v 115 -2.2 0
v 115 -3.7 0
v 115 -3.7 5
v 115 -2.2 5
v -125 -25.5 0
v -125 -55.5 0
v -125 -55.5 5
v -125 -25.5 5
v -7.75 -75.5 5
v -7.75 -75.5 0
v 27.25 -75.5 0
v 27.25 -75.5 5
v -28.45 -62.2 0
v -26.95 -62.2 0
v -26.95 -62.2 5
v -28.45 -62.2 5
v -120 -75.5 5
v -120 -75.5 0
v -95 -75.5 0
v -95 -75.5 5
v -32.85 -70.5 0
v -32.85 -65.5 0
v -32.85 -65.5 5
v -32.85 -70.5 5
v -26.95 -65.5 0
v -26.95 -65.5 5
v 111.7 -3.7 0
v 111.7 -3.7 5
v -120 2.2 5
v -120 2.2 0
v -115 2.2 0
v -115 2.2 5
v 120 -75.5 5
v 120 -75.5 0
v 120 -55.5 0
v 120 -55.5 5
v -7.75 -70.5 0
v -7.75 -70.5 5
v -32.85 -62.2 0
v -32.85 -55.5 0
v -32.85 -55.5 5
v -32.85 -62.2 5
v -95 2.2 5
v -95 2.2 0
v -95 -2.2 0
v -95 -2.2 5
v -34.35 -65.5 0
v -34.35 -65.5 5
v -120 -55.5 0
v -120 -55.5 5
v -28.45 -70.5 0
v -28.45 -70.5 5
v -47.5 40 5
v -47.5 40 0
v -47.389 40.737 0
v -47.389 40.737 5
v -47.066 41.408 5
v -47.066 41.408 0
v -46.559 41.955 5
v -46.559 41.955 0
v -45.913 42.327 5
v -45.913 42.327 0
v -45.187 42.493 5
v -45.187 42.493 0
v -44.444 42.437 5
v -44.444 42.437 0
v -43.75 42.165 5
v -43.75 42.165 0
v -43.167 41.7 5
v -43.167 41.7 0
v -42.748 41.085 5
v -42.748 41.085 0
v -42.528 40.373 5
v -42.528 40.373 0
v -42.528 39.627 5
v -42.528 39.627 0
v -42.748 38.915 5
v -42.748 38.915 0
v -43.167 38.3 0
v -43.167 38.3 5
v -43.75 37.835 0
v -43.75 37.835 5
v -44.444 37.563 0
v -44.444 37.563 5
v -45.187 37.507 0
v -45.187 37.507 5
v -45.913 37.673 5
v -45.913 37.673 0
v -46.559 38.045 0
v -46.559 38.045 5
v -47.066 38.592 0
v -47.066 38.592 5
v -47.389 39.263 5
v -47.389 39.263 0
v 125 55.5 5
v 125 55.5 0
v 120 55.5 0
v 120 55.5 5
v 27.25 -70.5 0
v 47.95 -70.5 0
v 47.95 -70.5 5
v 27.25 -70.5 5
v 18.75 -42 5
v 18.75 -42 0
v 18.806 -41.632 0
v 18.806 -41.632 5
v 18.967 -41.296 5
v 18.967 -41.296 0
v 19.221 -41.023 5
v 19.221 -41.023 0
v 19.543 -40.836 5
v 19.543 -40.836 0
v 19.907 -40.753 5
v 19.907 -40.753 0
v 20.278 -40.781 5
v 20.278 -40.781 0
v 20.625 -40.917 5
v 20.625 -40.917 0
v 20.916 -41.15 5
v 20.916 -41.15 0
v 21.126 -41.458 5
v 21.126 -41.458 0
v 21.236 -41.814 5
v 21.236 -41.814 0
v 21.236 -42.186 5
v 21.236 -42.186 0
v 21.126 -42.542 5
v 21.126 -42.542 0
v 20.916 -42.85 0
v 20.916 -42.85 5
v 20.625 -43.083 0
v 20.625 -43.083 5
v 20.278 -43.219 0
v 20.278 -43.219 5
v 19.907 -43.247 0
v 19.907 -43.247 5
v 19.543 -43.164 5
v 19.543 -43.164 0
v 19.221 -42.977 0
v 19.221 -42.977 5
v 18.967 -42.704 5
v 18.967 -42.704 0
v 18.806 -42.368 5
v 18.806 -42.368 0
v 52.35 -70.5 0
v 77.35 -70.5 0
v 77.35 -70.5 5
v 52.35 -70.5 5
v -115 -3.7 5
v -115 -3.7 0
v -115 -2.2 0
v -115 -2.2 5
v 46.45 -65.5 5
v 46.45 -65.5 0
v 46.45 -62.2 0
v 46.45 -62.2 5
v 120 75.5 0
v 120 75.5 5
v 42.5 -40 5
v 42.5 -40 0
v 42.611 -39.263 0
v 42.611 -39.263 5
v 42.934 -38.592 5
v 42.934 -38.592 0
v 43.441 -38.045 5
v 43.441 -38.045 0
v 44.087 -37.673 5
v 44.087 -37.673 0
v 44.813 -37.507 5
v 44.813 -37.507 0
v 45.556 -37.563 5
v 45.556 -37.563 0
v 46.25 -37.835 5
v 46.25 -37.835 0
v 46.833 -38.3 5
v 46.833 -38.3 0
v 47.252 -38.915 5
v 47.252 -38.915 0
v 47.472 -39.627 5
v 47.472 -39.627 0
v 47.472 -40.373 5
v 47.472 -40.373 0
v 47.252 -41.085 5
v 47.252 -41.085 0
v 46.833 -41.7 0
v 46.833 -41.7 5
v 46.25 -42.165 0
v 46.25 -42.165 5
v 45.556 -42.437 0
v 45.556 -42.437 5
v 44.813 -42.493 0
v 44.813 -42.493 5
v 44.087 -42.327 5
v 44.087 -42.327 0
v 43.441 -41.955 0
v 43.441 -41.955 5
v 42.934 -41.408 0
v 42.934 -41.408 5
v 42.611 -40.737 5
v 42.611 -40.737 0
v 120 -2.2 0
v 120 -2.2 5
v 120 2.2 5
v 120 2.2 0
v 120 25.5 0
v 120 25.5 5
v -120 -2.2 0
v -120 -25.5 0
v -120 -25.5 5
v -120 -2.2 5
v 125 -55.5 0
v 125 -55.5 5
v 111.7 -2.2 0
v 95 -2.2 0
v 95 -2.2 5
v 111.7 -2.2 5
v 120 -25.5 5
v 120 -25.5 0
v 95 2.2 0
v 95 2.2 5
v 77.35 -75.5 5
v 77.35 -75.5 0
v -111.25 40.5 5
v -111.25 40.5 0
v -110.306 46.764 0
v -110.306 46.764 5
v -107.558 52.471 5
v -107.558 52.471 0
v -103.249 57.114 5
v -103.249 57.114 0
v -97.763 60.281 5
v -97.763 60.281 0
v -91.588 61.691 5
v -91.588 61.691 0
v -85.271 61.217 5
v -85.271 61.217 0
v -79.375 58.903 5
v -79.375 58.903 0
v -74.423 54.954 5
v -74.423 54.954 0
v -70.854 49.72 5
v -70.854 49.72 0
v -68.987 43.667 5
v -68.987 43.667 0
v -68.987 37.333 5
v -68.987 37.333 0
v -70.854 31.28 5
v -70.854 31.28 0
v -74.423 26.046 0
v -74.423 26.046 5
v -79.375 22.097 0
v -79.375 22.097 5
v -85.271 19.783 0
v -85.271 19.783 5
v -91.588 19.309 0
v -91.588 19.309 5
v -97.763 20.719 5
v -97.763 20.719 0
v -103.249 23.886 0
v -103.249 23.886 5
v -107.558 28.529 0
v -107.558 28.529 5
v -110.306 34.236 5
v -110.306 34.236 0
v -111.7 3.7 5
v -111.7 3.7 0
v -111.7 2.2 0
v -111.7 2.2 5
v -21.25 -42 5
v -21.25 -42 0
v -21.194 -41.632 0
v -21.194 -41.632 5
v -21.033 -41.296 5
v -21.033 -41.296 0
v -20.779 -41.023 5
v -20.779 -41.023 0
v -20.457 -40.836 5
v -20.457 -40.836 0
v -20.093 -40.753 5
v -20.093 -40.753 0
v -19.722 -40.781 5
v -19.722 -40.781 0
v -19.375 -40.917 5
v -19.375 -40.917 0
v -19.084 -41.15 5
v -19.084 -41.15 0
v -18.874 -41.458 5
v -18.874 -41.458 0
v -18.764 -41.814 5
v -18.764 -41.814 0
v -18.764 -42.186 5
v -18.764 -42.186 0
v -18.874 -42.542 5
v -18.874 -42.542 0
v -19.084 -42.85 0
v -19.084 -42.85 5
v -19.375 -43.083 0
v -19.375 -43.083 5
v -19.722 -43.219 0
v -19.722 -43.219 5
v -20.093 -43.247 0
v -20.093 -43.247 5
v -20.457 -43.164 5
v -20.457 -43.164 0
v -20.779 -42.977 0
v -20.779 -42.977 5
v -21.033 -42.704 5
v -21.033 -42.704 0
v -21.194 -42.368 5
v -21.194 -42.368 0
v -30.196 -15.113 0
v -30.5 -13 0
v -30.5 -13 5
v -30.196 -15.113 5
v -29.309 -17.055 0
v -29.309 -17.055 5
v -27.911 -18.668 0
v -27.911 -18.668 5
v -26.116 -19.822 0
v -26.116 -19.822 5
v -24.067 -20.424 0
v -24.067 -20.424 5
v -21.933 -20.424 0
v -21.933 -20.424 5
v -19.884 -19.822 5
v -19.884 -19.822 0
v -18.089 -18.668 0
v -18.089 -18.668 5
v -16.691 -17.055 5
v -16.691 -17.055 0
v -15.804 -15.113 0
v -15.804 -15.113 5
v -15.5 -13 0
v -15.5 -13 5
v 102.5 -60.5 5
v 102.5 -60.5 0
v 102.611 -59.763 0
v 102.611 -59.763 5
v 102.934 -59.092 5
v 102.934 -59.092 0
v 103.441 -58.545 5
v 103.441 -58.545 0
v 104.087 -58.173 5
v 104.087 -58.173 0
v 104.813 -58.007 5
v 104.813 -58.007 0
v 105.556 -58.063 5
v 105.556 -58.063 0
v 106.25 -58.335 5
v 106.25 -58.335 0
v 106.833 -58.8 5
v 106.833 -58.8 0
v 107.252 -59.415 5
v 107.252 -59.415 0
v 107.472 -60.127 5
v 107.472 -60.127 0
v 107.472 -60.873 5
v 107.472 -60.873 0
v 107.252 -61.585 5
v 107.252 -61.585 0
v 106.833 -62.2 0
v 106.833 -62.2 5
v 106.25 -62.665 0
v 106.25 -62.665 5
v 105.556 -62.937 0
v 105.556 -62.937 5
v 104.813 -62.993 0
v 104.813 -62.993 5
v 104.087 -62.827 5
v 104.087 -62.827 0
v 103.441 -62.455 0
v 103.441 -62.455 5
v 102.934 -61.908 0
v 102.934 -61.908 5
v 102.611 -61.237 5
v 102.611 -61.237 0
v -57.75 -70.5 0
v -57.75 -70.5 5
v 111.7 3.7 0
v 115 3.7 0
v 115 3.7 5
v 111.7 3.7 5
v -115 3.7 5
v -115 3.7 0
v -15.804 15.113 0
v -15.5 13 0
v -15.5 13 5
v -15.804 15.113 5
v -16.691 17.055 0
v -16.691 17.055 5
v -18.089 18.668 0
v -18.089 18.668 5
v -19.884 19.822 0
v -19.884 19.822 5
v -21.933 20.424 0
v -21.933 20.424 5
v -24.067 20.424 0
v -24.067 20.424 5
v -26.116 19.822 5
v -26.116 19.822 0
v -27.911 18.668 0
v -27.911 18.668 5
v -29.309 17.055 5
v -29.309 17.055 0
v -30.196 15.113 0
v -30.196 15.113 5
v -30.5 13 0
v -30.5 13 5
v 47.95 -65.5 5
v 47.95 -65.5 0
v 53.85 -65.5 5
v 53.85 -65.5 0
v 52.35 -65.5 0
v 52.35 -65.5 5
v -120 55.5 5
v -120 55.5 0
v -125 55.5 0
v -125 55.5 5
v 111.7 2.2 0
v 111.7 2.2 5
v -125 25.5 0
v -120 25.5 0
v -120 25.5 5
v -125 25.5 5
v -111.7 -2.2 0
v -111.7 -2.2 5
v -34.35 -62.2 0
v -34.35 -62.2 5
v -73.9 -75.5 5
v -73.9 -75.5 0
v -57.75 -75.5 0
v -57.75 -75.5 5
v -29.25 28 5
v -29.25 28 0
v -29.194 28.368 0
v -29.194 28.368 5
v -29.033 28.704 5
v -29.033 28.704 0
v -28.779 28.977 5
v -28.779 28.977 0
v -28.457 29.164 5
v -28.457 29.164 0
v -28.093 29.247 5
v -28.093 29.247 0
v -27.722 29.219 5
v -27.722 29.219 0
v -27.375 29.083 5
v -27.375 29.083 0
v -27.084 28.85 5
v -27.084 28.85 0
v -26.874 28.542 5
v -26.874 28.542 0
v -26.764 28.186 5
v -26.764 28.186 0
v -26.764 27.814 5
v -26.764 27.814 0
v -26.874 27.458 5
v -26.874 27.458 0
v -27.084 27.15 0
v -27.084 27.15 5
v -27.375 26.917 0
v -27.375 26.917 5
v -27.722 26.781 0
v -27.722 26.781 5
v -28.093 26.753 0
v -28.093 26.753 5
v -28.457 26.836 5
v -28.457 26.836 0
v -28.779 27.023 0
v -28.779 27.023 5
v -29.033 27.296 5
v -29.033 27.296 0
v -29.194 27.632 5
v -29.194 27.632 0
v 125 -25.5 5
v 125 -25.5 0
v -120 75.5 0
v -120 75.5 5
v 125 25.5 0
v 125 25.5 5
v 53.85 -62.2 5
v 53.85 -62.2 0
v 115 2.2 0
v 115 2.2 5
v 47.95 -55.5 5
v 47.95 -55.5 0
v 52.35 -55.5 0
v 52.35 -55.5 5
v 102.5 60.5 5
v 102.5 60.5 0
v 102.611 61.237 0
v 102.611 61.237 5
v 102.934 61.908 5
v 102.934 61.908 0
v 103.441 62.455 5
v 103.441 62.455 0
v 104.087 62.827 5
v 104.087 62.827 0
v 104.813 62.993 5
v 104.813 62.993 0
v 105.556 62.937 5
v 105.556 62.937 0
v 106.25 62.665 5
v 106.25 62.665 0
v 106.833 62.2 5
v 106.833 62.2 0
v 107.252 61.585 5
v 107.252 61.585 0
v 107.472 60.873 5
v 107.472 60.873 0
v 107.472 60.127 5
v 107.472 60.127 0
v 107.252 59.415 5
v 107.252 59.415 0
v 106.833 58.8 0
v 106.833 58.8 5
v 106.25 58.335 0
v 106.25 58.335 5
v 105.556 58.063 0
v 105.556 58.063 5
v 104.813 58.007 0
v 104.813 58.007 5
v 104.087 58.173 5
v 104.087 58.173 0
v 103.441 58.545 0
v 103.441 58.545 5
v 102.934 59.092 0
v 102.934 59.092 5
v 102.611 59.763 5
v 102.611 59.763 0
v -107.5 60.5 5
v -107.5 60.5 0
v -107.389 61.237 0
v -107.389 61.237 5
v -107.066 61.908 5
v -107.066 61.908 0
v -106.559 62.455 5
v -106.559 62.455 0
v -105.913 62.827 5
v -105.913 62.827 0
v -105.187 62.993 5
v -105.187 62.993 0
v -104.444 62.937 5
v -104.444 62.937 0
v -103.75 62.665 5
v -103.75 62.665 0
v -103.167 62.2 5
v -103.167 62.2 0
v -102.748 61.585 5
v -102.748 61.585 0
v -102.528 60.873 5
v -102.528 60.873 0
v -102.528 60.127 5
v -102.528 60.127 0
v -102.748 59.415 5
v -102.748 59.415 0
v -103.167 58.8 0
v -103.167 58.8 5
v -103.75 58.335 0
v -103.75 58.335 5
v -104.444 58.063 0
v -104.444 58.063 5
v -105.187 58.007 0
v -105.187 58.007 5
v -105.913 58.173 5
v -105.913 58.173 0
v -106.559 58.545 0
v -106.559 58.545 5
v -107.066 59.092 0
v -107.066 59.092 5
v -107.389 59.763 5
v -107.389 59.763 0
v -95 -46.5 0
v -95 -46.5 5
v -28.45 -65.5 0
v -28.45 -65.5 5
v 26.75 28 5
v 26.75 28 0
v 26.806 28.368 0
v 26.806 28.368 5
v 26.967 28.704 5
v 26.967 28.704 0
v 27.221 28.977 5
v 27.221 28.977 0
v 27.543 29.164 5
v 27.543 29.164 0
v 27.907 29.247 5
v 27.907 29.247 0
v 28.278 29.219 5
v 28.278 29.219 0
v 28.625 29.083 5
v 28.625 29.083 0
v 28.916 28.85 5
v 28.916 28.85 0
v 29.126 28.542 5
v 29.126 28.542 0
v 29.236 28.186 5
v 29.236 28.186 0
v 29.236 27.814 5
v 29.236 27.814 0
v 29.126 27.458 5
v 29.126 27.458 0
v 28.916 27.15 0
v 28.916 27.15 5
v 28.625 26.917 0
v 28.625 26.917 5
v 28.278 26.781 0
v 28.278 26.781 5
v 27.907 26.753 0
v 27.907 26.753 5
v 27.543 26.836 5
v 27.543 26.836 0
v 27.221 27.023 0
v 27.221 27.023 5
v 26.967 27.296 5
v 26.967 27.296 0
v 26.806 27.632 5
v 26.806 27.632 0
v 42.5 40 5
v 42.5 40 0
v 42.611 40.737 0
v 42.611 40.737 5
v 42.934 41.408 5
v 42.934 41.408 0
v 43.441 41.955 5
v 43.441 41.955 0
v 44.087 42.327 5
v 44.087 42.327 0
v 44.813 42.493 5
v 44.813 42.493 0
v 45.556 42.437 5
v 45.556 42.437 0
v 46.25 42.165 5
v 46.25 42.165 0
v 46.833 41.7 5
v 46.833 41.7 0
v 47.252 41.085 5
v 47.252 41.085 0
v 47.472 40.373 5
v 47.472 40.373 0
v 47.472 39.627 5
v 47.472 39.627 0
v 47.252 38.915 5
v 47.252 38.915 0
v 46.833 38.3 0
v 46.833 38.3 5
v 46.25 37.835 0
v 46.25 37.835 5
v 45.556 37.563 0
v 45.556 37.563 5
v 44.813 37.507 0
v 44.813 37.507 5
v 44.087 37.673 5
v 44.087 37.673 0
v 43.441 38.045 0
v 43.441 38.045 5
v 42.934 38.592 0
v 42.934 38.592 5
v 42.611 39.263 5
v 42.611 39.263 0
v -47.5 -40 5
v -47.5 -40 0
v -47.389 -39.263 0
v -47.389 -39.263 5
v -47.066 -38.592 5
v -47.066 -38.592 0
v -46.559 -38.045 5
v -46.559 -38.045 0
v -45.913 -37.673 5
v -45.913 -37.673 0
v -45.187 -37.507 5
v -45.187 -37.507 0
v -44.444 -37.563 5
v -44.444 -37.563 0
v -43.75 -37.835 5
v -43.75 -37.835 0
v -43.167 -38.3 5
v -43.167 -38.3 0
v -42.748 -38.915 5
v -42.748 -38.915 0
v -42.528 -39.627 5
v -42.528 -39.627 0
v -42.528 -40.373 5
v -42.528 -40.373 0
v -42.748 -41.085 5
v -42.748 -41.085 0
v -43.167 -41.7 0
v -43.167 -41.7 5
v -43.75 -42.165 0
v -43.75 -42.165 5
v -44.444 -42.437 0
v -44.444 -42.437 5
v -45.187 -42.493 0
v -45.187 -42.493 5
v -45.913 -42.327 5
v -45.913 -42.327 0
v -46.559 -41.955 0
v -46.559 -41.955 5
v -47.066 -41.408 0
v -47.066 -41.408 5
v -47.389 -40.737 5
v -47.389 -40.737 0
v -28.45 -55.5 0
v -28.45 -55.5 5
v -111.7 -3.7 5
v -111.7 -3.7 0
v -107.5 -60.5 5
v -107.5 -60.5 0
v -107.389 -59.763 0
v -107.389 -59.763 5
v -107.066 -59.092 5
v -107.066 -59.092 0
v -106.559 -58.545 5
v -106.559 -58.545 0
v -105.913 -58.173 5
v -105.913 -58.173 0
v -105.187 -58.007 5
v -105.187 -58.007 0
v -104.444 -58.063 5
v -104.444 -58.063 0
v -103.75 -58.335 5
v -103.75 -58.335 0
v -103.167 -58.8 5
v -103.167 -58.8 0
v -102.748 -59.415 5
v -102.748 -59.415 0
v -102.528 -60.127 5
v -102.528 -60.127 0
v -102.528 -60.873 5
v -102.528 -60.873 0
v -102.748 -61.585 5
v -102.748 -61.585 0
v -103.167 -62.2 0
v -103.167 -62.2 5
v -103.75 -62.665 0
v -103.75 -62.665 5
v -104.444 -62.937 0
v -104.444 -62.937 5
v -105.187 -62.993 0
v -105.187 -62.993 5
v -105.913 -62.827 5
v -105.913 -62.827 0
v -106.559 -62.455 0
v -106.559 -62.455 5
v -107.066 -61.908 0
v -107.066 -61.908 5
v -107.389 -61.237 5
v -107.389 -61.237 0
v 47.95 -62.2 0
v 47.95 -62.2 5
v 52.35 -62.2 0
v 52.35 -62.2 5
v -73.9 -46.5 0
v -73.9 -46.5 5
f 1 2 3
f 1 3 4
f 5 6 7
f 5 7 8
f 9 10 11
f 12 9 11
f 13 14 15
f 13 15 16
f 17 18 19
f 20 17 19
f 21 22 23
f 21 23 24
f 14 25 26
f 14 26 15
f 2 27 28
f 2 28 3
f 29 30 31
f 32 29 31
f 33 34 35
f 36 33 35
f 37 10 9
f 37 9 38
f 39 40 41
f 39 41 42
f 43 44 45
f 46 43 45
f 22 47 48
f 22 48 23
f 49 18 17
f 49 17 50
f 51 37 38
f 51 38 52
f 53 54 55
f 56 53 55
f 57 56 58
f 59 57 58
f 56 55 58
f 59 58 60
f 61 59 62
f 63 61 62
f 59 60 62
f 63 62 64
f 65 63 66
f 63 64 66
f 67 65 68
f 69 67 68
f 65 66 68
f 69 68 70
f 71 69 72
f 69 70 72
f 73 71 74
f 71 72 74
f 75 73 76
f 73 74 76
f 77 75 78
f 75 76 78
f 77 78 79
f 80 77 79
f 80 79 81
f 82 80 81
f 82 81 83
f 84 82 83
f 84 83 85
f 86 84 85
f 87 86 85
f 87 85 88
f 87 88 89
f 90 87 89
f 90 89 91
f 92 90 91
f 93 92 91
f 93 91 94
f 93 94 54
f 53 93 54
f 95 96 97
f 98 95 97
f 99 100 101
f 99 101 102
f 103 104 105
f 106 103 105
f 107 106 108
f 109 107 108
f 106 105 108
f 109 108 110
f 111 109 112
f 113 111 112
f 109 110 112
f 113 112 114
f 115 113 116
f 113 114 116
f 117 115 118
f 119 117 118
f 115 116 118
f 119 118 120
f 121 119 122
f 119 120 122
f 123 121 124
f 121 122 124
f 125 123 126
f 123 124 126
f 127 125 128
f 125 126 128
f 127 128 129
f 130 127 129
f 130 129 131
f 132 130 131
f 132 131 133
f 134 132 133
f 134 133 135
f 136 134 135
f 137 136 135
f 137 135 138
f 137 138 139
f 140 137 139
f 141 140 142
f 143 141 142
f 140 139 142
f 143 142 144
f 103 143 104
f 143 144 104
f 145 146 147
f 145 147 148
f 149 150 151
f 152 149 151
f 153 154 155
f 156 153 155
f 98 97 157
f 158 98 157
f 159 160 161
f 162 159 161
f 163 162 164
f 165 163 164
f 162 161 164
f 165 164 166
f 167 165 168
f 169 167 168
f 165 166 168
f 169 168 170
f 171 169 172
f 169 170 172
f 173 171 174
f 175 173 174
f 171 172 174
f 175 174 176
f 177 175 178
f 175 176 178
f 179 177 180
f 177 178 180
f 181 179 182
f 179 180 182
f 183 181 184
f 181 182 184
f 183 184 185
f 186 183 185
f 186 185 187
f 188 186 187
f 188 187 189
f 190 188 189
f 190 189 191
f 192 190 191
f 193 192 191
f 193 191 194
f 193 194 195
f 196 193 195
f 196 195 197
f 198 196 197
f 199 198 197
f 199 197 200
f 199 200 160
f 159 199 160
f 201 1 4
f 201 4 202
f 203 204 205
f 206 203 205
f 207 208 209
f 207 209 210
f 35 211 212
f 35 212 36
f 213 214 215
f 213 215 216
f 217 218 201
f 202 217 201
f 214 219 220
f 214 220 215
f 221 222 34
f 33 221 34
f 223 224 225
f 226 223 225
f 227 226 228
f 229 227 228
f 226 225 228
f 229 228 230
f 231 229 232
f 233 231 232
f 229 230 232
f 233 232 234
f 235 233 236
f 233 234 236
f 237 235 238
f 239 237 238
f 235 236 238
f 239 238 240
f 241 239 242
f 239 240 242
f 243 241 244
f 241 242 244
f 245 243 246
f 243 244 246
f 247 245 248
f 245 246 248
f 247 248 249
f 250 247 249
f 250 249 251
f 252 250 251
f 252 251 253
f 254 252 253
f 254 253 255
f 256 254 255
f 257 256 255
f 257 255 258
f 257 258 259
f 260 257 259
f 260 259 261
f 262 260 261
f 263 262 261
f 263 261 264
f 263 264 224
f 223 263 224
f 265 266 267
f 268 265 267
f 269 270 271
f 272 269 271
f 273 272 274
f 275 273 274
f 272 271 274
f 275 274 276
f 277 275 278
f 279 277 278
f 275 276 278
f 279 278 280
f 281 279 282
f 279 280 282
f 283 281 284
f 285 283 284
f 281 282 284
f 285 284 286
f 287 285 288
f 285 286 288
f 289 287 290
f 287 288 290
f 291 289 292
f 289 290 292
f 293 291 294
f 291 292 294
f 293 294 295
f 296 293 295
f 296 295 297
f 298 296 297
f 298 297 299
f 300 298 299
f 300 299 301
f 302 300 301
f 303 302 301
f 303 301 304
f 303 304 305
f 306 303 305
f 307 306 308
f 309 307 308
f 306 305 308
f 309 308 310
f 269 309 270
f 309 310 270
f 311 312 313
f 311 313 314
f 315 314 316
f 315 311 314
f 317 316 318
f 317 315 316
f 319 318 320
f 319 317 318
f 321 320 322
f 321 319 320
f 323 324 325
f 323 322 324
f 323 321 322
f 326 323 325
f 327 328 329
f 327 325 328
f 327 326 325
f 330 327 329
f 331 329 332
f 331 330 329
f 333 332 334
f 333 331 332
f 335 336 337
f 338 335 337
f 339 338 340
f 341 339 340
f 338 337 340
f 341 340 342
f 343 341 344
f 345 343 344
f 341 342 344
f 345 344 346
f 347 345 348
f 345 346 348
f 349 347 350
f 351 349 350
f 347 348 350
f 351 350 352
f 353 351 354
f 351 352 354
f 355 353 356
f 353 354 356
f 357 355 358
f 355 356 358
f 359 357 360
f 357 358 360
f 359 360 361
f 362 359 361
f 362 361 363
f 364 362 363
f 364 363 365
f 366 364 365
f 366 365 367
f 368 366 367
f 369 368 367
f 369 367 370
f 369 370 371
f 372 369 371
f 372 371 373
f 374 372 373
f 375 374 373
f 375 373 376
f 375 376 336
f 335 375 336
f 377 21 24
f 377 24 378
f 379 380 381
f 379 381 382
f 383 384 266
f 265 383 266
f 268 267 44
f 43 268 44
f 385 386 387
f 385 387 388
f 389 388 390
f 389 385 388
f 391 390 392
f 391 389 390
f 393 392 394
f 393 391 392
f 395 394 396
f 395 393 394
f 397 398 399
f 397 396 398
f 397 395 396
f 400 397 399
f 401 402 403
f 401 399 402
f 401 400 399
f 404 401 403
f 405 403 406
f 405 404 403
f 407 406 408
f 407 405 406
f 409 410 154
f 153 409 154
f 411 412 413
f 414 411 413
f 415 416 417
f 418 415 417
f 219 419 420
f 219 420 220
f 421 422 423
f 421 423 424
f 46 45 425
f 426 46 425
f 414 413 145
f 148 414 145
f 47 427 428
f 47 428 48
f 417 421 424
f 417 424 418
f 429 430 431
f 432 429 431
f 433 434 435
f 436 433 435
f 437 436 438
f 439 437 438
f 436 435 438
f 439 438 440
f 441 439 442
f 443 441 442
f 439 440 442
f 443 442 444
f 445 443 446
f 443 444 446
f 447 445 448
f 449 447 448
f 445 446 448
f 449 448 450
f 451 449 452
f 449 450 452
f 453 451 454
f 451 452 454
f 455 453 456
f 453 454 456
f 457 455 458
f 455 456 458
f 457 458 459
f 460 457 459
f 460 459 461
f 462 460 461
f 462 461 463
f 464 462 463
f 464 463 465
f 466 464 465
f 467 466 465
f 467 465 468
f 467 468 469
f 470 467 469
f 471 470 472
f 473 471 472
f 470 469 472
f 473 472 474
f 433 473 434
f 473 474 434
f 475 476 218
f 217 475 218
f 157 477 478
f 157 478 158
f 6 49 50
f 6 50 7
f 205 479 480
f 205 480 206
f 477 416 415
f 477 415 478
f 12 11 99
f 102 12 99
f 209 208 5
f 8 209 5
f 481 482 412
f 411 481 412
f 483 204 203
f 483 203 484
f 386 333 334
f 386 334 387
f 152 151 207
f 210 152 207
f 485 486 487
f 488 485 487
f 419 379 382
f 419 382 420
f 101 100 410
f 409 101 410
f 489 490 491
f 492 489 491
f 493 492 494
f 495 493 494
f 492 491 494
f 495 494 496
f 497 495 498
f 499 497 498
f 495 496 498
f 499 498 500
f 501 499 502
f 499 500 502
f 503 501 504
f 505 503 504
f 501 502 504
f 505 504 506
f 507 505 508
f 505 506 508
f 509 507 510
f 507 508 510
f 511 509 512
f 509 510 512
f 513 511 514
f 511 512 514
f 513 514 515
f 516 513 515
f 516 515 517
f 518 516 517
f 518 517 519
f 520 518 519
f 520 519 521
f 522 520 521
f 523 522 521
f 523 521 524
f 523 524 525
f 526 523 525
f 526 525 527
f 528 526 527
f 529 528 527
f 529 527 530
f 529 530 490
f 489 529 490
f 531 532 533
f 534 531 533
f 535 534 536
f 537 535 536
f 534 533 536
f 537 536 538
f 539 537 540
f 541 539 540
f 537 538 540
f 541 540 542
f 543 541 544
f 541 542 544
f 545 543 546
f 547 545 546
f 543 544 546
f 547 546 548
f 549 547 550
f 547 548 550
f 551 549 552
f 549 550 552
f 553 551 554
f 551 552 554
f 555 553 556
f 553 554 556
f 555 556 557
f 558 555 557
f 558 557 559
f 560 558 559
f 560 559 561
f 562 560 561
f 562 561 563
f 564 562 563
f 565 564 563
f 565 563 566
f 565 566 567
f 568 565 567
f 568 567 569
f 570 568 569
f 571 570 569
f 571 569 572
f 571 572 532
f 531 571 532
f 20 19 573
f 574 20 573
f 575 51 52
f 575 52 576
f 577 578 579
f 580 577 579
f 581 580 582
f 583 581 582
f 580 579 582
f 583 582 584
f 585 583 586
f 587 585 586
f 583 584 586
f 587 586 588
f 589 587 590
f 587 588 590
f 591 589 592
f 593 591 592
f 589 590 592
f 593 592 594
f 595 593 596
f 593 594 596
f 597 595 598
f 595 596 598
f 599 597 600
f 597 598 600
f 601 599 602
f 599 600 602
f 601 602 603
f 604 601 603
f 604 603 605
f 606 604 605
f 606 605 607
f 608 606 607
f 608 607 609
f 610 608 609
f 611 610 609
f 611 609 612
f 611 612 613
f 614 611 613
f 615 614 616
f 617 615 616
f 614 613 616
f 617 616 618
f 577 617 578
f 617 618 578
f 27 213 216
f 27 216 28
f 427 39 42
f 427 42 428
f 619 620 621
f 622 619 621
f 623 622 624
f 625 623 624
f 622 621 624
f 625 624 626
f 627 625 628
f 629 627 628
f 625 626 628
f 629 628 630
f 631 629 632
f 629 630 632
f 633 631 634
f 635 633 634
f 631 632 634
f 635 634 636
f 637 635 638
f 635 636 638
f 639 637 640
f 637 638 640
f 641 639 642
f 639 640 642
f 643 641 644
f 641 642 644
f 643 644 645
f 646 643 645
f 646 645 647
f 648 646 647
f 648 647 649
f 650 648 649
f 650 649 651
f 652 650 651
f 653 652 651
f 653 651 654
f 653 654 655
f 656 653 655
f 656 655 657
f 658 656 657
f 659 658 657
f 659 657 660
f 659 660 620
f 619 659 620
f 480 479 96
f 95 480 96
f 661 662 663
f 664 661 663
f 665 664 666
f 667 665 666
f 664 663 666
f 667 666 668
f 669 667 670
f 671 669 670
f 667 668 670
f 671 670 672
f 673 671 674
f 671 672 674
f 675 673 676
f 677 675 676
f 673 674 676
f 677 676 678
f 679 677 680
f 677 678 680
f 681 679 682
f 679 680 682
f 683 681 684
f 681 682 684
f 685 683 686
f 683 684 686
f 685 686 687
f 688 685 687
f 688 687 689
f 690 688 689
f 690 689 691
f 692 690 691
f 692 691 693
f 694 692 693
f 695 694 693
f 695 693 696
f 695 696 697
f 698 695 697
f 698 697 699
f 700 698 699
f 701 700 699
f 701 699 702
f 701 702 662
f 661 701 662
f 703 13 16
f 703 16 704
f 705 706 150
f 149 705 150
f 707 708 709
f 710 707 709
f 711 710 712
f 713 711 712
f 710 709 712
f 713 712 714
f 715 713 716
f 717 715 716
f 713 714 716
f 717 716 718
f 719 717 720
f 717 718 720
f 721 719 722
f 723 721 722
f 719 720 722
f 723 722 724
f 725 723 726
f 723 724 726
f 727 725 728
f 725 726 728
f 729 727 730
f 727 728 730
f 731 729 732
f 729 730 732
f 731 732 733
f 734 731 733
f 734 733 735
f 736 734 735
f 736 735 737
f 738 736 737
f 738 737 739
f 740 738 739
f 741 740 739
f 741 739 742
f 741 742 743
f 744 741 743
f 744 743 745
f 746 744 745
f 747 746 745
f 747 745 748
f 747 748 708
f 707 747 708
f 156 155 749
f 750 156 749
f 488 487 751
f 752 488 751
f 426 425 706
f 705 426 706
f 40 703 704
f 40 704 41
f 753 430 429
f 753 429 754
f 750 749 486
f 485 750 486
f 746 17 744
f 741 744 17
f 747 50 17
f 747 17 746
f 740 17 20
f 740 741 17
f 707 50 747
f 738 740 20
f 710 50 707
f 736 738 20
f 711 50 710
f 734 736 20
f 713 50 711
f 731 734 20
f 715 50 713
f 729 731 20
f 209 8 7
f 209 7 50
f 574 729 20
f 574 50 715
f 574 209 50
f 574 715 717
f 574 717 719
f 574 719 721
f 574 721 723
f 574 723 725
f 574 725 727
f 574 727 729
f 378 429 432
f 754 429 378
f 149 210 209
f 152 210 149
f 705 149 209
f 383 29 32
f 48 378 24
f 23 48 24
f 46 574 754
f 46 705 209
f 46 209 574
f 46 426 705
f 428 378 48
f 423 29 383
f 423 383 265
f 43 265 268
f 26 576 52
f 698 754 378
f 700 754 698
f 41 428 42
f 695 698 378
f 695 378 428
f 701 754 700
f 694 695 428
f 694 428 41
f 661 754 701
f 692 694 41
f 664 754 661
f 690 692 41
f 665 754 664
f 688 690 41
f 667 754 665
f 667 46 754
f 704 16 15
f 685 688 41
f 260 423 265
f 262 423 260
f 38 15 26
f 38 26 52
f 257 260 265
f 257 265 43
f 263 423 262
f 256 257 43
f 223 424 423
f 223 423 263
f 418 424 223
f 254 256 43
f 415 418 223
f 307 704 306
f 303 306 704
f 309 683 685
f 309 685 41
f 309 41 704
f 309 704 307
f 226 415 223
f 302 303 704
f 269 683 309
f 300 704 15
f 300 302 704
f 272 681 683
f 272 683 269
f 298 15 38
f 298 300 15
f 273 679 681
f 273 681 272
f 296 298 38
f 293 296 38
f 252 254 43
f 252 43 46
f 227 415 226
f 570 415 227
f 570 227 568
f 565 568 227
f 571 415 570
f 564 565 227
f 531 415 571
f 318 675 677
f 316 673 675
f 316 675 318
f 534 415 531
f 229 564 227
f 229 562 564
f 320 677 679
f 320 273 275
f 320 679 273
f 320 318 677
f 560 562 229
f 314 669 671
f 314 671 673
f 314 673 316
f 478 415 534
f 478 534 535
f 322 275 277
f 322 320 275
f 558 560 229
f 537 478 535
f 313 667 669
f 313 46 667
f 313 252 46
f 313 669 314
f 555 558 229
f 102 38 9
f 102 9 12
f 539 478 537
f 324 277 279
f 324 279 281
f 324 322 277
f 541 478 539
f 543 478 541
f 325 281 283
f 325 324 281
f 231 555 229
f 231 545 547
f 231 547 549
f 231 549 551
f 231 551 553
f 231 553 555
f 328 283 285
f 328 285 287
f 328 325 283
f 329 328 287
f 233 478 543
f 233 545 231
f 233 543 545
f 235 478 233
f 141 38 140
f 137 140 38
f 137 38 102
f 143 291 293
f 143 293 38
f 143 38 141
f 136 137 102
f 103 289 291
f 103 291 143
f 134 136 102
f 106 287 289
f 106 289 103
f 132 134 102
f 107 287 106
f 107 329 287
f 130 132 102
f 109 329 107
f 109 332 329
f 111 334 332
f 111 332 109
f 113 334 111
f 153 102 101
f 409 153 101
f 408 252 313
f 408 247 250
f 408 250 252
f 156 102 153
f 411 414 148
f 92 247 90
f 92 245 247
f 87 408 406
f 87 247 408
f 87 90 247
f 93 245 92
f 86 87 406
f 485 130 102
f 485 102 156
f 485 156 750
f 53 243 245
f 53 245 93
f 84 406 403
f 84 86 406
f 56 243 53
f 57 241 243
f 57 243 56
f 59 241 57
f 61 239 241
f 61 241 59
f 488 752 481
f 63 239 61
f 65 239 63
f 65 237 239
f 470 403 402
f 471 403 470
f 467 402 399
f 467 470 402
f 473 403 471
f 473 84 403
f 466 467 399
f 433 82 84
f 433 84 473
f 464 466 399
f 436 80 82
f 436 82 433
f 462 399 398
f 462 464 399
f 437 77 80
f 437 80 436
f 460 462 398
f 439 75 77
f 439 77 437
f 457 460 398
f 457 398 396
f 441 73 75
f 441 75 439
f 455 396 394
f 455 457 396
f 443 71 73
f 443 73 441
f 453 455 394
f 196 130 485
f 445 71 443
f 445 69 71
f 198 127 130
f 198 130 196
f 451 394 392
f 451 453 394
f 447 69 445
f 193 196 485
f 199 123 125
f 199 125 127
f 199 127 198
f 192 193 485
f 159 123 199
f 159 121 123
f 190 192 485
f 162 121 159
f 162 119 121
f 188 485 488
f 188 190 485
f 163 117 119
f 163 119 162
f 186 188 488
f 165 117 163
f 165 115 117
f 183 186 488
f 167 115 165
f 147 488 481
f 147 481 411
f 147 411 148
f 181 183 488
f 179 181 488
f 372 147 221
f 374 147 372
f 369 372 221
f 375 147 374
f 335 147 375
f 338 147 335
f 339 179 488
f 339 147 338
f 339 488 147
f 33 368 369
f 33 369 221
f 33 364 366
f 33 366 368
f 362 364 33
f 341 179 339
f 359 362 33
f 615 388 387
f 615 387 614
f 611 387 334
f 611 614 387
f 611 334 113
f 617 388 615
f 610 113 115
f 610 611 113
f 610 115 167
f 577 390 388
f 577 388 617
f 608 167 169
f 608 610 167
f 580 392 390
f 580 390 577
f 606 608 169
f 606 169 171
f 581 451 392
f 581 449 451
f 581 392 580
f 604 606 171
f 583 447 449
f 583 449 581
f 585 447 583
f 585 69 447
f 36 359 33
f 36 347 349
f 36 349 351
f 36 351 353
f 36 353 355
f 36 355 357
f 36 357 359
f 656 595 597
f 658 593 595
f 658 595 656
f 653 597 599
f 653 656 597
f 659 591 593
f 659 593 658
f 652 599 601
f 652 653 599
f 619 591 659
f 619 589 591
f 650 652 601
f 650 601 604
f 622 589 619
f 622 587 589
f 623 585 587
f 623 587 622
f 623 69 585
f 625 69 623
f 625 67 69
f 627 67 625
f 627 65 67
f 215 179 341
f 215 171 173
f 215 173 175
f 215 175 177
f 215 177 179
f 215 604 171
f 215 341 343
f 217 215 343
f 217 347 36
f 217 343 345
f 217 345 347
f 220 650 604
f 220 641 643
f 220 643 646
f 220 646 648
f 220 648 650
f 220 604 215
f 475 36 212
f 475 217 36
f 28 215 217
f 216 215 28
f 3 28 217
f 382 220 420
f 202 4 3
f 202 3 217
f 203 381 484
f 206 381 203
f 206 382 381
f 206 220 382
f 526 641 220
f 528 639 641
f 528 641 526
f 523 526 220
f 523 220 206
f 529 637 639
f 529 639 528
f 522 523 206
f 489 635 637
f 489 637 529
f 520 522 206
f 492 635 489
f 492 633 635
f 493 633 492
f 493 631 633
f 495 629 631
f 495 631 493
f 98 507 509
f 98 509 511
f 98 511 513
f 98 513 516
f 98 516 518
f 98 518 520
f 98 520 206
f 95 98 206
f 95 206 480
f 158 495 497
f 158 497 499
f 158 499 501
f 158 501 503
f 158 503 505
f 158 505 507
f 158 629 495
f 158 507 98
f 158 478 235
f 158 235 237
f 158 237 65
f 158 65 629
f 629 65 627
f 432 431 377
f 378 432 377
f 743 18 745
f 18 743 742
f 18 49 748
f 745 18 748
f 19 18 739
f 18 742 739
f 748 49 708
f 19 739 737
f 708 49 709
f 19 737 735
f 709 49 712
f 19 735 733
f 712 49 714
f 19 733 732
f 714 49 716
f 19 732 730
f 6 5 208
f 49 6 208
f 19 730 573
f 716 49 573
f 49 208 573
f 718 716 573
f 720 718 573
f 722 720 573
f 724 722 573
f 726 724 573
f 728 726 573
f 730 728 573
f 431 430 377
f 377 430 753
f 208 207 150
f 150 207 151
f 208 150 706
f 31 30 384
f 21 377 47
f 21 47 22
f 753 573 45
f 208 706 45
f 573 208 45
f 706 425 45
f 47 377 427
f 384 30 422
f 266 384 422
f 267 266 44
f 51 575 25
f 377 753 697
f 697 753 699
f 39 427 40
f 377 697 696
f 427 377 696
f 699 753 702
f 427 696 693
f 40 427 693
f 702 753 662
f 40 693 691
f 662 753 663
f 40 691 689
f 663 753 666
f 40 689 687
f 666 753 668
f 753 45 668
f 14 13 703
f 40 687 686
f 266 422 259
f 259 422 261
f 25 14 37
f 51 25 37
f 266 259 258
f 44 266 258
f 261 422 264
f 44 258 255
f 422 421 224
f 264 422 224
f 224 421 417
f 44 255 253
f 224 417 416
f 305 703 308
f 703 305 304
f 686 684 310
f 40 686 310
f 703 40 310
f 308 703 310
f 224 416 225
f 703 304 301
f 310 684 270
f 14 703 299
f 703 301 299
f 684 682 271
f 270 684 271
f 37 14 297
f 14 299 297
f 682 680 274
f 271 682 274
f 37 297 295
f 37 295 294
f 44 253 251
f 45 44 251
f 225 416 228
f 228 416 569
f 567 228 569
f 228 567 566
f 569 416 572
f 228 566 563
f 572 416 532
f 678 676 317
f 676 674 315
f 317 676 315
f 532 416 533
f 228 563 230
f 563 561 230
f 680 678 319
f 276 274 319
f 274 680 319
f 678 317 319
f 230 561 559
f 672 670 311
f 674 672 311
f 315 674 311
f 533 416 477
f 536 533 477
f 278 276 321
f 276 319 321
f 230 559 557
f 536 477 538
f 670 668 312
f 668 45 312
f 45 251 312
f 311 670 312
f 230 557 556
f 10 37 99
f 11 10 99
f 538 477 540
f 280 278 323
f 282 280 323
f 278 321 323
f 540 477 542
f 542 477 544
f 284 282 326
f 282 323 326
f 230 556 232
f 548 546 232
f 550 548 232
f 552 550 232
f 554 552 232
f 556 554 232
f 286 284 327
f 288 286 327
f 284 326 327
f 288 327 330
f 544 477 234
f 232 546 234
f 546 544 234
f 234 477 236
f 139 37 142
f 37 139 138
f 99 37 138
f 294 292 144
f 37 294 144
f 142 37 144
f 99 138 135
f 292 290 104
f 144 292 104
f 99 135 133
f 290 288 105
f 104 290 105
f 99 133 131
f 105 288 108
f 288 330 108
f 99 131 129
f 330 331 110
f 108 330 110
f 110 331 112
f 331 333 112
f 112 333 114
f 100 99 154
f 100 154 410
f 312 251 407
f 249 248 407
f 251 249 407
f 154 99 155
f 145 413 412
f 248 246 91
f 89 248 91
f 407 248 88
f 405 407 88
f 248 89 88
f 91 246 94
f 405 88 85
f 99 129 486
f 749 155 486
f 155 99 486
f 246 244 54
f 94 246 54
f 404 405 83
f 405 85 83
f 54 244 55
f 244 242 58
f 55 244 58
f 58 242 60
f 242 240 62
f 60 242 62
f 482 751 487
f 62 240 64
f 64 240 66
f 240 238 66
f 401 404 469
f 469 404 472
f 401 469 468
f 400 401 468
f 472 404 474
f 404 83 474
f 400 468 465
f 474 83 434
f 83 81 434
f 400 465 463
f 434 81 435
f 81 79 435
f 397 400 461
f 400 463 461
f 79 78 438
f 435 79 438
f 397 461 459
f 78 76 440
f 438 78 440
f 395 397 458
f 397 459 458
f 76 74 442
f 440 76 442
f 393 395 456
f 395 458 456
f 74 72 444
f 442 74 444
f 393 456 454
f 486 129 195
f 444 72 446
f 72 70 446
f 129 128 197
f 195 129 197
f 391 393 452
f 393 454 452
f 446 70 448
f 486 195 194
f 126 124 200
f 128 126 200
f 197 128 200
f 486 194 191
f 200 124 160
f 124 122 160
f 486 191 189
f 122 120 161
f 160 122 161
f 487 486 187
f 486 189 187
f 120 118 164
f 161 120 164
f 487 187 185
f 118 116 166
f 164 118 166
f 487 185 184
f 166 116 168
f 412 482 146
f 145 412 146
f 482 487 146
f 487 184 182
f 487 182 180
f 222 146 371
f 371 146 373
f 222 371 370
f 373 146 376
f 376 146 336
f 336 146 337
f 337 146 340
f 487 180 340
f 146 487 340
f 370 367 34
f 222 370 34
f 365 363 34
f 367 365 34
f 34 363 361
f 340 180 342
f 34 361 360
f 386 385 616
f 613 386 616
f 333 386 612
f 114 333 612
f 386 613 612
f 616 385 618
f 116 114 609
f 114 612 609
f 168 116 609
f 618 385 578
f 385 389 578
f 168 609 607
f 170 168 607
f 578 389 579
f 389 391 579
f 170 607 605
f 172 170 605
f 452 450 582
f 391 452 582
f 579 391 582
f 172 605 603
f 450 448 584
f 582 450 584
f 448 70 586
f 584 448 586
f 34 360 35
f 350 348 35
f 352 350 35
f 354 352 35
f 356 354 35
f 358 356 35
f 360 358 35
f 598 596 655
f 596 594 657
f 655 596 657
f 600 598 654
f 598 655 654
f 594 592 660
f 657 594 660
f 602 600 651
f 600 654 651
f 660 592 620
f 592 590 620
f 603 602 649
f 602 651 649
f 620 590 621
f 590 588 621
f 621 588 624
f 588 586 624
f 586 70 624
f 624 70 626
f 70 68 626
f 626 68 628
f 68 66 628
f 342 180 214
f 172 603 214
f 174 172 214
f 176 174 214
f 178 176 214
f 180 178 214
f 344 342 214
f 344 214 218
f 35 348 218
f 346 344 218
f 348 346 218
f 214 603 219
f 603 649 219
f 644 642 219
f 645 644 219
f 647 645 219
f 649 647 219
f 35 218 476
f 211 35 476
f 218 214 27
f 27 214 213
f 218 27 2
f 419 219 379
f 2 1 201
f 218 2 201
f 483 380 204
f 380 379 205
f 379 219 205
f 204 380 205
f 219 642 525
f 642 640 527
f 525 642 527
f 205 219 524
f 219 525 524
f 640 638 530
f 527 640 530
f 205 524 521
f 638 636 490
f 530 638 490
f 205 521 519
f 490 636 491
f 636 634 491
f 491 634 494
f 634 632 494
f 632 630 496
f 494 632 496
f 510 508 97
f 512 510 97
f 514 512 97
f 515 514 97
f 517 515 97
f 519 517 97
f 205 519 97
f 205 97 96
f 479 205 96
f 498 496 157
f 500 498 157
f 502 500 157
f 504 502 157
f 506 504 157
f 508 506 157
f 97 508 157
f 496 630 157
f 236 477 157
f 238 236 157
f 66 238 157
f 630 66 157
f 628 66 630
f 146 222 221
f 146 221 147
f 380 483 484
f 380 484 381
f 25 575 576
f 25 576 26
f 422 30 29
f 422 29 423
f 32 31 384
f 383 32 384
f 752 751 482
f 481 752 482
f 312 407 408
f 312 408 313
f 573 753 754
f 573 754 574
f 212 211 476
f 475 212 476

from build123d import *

# Parameters (mm, degrees)
SKETCH1_W           = 240
SKETCH1_H           = 151
BOSS_EXTRUDE1_DEPTH = 5
SKETCH2_R           = 1.25
CUT_EXTRUDE1_DEPTH  = 5
CUT_EXTRUDE2_DEPTH  = 10
SKETCH6_R           = 2.5
CUT_EXTRUDE3_DEPTH  = 10
SKETCH7_R           = 2.5
CUT_EXTRUDE4_DEPTH  = 10
SKETCH8_W           = 21.1
SKETCH8_H           = 29
CUT_EXTRUDE5_DEPTH  = 10
SKETCH9_W           = 5
SKETCH9_H           = 30
BOSS_EXTRUDE2_DEPTH = 5
CUT_EXTRUDE6_DEPTH  = 5
SKETCH11_W          = 50
SKETCH11_H          = 5
SKETCH11_W_2        = 50.1
CUT_EXTRUDE7_DEPTH  = 10
CUT_EXTRUDE8_DEPTH  = 10
SKETCH15_R          = 21.25
CUT_EXTRUDE9_DEPTH  = 10


with BuildPart() as part:
    # Sketch1 → Boss-Extrude1 (new body)
    with BuildSketch(Plane.XY):
        Rectangle(SKETCH1_W, SKETCH1_H)
    extrude(amount=BOSS_EXTRUDE1_DEPTH)

    # Sketch2 → Cut-Extrude1 (cut)
    with BuildSketch(Plane(origin=(0, 0, 0), x_dir=(-1, 0, 0), z_dir=(0, 0, -1))):
        with Locations((28, 28)):
            Circle(SKETCH2_R)
        with Locations((-28, 28)):
            Circle(SKETCH2_R)
        with Locations((20, -42)):
            Circle(SKETCH2_R)
        with Locations((-20, -42)):
            Circle(SKETCH2_R)
    extrude(amount=-CUT_EXTRUDE1_DEPTH, mode=Mode.SUBTRACT)

    # Sketch5 → Cut-Extrude2 (cut)
    with BuildSketch(Plane(origin=(0, 0, 0), x_dir=(-1, 0, 0), z_dir=(0, 0, -1))):
        with BuildLine():
            Line((15.5, -13), (15.5, 13))
            ThreePointArc((15.5, 13), (23, 20.5), (30.5, 13))
            Line((30.5, 13), (30.5, -13))
            ThreePointArc((30.5, -13), (23, -20.5), (15.5, -13))
        make_face()
    extrude(amount=-CUT_EXTRUDE2_DEPTH, mode=Mode.SUBTRACT)

    # Sketch6 → Cut-Extrude3 (cut)
    with BuildSketch(Plane(origin=(0, 0, 0), x_dir=(-1, 0, 0), z_dir=(0, 0, -1))):
        with Locations((-105, 60.5)):
            Circle(SKETCH6_R)
        with Locations((-105, -60.5)):
            Circle(SKETCH6_R)
        with Locations((105, -60.5)):
            Circle(SKETCH6_R)
        with Locations((105, 60.5)):
            Circle(SKETCH6_R)
    extrude(amount=-CUT_EXTRUDE3_DEPTH, mode=Mode.SUBTRACT)

    # Sketch7 → Cut-Extrude4 (cut)
    with BuildSketch(Plane(origin=(0, 0, 0), x_dir=(-1, 0, 0), z_dir=(0, 0, -1))):
        with Locations((45, 40)):
            Circle(SKETCH7_R)
        with Locations((45, -40)):
            Circle(SKETCH7_R)
        with Locations((-45, 40)):
            Circle(SKETCH7_R)
        with Locations((-45, -40)):
            Circle(SKETCH7_R)
    extrude(amount=-CUT_EXTRUDE4_DEPTH, mode=Mode.SUBTRACT)

    # Sketch8 → Cut-Extrude5 (cut)
    with BuildSketch(Plane(origin=(0, 0, 0), x_dir=(-1, 0, 0), z_dir=(0, 0, -1))):
        with Locations((84.45, -61)):
            Rectangle(SKETCH8_W, SKETCH8_H)
    extrude(amount=-CUT_EXTRUDE5_DEPTH, mode=Mode.SUBTRACT)

    # Sketch9 → Boss-Extrude2 (add)
    with BuildSketch(Plane(origin=(0, 0, 0), x_dir=(-1, 0, 0), z_dir=(0, 0, -1))):
        with Locations((122.5, 40.5)):
            Rectangle(SKETCH9_W, SKETCH9_H)
        with Locations((122.5, -40.5)):
            Rectangle(SKETCH9_W, SKETCH9_H)
        with Locations((-122.5, -40.5)):
            Rectangle(SKETCH9_W, SKETCH9_H)
        with Locations((-122.5, 40.5)):
            Rectangle(SKETCH9_W, SKETCH9_H)
    extrude(amount=-BOSS_EXTRUDE2_DEPTH)

    # Sketch10 → Cut-Extrude6 (cut)
    with BuildSketch(Plane(origin=(0, 0, 0), x_dir=(-1, 0, 0), z_dir=(0, 0, -1))):
        Polygon((-120, 2.2), (-115, 2.2), (-115, 3.7), (-111.7, 3.7), (-111.7, 2.2), (-95, 2.2), (-95, -2.2), (-111.7, -2.2), (-111.7, -3.7), (-115, -3.7), (-115, -2.2), (-120, -2.2), align=None)
        Polygon((115, -2.2), (120, -2.2), (120, 2.2), (115, 2.2), (115, 3.7), (111.7, 3.7), (111.7, 2.2), (95, 2.2), (95, -2.2), (111.7, -2.2), (111.7, -3.7), (115, -3.7), align=None)
    extrude(amount=-CUT_EXTRUDE6_DEPTH, mode=Mode.SUBTRACT)

    # Sketch11 → Cut-Extrude7 (cut)
    with BuildSketch(Plane(origin=(0, 0, 0), x_dir=(-1, 0, 0), z_dir=(0, 0, -1))):
        with Locations((32.75, -73)):
            Rectangle(SKETCH11_W, SKETCH11_H)
        with Locations((-52.3, -73)):
            Rectangle(SKETCH11_W_2, SKETCH11_H)
    extrude(amount=-CUT_EXTRUDE7_DEPTH, mode=Mode.SUBTRACT)

    # Sketch12 → Cut-Extrude8 (cut)
    with BuildSketch(Plane(origin=(0, 0, 0), x_dir=(-1, 0, 0), z_dir=(0, 0, -1))):
        Polygon((-52.35, -55.5), (-52.35, -62.2), (-53.85, -62.2), (-53.85, -65.5), (-52.35, -65.5), (-52.35, -70.5), (-47.95, -70.5), (-47.95, -65.5), (-46.45, -65.5), (-46.45, -62.2), (-47.95, -62.2), (-47.95, -55.5), align=None)
        Polygon((32.85, -70.5), (28.45, -70.5), (28.45, -65.5), (26.95, -65.5), (26.95, -62.2), (28.45, -62.2), (28.45, -55.5), (32.85, -55.5), (32.85, -62.2), (34.35, -62.2), (34.35, -65.5), (32.85, -65.5), align=None)
    extrude(amount=-CUT_EXTRUDE8_DEPTH, mode=Mode.SUBTRACT)

    # Sketch15 → Cut-Extrude9 (cut)
    with BuildSketch(Plane(origin=(0, 0, 0), x_dir=(-1, 0, 0), z_dir=(0, 0, -1))):
        with Locations((90, 40.5)):
            Circle(SKETCH15_R)
    extrude(amount=-CUT_EXTRUDE9_DEPTH, mode=Mode.SUBTRACT)


solid = part.part
